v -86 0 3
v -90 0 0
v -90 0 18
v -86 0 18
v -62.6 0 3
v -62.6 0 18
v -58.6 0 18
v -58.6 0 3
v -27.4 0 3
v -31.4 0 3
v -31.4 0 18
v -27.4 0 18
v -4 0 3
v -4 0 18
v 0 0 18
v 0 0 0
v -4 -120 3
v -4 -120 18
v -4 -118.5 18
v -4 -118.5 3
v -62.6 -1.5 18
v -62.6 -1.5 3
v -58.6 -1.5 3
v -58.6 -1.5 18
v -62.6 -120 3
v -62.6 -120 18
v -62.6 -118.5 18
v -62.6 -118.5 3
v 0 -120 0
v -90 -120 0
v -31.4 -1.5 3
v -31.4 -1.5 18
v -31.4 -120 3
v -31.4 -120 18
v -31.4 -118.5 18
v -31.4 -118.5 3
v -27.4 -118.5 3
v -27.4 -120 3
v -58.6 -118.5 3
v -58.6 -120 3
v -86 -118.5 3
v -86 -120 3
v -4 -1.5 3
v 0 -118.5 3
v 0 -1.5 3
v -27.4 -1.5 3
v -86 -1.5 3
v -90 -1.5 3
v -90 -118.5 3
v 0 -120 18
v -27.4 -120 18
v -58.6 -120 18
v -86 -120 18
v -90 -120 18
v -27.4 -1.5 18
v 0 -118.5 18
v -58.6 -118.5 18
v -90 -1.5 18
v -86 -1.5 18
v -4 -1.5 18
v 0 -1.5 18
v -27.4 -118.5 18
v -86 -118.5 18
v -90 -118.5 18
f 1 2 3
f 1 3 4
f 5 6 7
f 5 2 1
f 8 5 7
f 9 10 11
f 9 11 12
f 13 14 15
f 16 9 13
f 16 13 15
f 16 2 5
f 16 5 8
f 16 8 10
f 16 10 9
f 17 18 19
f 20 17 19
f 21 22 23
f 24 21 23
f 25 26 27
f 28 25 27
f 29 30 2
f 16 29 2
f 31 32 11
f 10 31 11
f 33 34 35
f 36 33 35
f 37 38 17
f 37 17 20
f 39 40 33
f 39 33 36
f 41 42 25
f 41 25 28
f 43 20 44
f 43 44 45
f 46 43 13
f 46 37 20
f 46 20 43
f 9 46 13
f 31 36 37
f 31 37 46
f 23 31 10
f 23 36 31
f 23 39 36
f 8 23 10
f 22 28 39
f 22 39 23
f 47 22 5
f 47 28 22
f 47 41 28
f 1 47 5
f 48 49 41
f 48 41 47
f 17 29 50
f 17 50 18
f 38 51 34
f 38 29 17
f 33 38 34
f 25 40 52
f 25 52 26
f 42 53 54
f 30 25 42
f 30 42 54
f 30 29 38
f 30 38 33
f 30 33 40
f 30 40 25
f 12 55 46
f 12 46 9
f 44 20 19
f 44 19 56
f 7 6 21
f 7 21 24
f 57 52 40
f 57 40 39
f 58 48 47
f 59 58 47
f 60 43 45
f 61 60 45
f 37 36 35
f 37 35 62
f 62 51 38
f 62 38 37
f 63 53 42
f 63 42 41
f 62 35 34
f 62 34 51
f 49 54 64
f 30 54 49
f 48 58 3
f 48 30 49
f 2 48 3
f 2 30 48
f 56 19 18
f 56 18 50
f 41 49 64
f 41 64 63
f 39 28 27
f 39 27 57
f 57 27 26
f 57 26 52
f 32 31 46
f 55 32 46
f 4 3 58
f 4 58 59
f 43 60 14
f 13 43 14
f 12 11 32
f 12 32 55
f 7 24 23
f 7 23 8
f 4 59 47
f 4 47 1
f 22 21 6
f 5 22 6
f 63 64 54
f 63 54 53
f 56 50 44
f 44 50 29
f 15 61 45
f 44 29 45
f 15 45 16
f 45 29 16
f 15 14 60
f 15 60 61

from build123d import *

# Parameters (mm, degrees)
SKETCH1_W           = 120
SKETCH1_H           = 90
BOSS_EXTRUDE1_DEPTH = 3
SKETCH2_W           = 4
SKETCH2_H           = 1.5
BOSS_EXTRUDE2_DEPTH = 15


with BuildPart() as part:
    # Sketch1 → Boss-Extrude1 (new body)
    with BuildSketch(Plane(origin=(0, 0, 0), x_dir=(0, 1, 0), z_dir=(0, 0, 1))):
        with Locations((-60, 45)):
            Rectangle(SKETCH1_W, SKETCH1_H)
    extrude(amount=BOSS_EXTRUDE1_DEPTH)

    # Sketch2 → Boss-Extrude2 (add)
    with BuildSketch(Plane.XY.offset(3)):
        with Locations((-88, -0.75)):
            Rectangle(SKETCH2_W, SKETCH2_H)
        with Locations((-60.6, -0.75)):
            Rectangle(SKETCH2_W, SKETCH2_H)
        with Locations((-29.4, -0.75)):
            Rectangle(SKETCH2_W, SKETCH2_H)
        with Locations((-2, -0.75)):
            Rectangle(SKETCH2_W, SKETCH2_H)
        with Locations((-88, -119.25)):
            Rectangle(SKETCH2_W, SKETCH2_H)
        with Locations((-60.6, -119.25)):
            Rectangle(SKETCH2_W, SKETCH2_H)
        with Locations((-29.4, -119.25)):
            Rectangle(SKETCH2_W, SKETCH2_H)
        with Locations((-2, -119.25)):
            Rectangle(SKETCH2_W, SKETCH2_H)
    extrude(amount=BOSS_EXTRUDE2_DEPTH)


solid = part.part
